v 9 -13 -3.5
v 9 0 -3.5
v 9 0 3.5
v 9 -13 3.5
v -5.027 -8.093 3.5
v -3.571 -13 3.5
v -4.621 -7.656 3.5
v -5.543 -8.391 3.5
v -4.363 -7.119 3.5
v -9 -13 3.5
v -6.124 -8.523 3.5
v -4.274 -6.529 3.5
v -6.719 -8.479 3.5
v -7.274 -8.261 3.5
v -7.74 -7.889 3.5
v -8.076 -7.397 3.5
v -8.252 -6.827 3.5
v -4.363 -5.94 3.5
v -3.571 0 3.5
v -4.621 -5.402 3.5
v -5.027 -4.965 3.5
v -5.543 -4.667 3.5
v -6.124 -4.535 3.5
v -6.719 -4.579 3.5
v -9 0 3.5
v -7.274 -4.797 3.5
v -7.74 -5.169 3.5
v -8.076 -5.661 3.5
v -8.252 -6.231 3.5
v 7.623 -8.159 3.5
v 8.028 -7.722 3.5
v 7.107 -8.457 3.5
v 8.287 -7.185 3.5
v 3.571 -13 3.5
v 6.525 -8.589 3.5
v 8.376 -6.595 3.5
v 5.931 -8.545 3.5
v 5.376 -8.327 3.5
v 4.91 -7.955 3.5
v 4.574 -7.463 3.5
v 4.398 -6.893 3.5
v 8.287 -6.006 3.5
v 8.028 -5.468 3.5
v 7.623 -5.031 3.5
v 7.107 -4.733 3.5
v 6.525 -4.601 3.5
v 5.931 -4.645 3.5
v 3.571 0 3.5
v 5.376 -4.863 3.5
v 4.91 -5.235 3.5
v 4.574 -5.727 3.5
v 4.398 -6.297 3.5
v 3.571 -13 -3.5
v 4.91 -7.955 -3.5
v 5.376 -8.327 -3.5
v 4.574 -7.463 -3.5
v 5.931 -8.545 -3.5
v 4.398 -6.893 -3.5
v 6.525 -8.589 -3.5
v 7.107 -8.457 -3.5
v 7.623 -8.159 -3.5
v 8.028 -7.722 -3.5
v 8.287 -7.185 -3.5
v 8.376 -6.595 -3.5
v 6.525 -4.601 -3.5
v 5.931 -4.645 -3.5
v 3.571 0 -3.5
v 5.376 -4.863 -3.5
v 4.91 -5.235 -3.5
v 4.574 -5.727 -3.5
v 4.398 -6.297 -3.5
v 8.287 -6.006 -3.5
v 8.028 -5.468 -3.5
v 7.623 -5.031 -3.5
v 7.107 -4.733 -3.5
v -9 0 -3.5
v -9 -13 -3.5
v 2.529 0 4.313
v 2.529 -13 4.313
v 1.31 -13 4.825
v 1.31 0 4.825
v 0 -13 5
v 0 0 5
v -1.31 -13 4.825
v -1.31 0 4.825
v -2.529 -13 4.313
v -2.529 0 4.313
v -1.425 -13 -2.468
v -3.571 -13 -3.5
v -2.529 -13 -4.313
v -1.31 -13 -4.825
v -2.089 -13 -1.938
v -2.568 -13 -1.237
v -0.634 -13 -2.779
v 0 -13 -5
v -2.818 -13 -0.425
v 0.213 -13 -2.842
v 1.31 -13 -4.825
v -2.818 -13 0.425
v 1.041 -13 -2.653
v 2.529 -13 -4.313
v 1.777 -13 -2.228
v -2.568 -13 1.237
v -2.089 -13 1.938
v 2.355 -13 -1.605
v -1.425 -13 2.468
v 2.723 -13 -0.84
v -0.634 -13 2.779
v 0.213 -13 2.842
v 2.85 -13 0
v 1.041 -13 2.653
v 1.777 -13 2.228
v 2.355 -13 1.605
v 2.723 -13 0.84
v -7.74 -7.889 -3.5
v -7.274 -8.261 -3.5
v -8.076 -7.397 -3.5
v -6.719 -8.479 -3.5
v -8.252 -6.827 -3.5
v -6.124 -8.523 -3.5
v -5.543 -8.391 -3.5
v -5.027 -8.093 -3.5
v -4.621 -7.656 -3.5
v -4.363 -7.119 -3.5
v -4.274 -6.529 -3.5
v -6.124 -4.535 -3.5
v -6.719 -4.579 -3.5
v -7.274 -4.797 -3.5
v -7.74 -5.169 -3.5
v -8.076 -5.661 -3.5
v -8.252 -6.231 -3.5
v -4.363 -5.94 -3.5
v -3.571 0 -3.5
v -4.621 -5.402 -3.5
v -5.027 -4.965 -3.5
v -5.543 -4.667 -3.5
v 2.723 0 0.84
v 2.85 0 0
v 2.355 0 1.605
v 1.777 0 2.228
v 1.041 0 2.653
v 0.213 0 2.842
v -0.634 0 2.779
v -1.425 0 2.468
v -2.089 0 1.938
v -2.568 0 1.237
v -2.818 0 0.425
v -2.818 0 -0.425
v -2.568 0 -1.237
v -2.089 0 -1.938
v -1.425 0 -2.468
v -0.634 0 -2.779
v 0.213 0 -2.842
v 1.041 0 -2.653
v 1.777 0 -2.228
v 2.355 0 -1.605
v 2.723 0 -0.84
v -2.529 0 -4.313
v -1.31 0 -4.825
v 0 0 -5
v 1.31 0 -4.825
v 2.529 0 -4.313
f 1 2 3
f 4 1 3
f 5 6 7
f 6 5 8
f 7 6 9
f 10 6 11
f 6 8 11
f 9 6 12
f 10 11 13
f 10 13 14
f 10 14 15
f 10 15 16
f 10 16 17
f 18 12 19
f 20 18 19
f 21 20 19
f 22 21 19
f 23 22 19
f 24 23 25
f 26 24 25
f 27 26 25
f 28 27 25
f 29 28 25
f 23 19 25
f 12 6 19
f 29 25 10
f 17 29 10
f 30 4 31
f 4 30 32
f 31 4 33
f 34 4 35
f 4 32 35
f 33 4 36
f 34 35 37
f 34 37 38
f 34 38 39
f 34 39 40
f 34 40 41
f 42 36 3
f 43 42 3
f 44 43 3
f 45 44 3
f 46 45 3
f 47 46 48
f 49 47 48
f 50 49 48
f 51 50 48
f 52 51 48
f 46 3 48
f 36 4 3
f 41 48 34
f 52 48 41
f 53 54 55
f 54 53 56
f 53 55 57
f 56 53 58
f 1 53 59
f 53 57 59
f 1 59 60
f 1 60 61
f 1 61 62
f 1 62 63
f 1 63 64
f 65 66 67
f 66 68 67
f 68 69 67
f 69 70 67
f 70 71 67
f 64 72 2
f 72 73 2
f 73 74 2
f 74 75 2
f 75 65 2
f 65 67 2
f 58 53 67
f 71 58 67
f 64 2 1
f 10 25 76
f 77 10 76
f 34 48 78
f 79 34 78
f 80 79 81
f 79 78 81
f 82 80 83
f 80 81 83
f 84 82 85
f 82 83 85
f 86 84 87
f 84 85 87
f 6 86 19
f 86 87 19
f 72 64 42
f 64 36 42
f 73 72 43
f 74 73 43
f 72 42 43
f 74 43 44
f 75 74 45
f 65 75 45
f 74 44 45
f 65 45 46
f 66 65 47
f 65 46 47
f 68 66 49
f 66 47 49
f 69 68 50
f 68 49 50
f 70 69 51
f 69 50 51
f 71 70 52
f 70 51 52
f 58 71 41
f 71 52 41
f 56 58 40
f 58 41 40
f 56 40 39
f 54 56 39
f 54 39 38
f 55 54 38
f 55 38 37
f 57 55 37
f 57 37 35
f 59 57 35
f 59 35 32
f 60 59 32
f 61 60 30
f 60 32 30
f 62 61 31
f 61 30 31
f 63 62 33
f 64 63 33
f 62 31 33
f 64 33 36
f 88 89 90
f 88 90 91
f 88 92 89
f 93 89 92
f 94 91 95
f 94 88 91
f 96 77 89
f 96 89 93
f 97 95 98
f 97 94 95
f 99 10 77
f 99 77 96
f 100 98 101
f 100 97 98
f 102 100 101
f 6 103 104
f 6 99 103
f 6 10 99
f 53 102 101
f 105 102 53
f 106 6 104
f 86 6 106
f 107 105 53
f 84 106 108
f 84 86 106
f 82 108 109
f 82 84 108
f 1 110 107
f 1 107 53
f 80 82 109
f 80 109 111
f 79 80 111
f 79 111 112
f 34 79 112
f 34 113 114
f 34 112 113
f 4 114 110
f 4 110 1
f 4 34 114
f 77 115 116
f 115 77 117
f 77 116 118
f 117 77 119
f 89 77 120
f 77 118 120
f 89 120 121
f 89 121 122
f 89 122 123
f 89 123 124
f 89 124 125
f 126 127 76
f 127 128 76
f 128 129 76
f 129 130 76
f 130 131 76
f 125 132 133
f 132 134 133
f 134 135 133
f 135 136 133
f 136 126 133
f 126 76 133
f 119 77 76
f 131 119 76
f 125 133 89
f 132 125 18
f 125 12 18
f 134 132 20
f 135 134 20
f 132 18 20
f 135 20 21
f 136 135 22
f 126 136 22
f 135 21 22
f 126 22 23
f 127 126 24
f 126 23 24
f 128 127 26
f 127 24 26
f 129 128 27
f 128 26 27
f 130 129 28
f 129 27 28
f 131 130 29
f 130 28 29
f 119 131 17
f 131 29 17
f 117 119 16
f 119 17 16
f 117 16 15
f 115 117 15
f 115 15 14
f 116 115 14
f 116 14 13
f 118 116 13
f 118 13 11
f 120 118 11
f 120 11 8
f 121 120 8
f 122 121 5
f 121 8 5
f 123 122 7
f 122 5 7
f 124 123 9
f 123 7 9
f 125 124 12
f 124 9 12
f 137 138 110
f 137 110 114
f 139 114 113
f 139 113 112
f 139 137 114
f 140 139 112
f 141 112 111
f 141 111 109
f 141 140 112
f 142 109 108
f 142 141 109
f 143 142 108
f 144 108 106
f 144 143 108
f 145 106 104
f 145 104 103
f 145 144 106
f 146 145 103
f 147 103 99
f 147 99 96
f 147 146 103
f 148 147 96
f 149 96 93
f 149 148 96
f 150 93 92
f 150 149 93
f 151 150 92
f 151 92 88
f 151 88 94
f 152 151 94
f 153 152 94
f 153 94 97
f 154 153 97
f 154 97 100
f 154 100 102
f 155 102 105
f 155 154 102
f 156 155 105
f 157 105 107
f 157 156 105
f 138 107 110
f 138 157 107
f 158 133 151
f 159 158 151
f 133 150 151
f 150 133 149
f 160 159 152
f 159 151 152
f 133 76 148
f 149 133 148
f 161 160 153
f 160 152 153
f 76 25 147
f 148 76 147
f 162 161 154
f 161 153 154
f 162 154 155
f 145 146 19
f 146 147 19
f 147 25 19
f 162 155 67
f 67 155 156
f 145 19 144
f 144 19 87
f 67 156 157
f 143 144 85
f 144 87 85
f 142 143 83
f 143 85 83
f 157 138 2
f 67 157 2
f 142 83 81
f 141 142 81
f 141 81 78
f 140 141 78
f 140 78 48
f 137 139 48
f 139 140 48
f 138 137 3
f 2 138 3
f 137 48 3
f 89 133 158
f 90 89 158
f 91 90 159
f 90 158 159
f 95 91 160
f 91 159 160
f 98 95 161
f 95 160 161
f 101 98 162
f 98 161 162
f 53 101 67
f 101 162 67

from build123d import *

# Parameters (mm, degrees)
F0_R     = 2.85
F1_DEPTH = 13
F2_R     = 2
F3_DEPTH = 12.5
F4_R     = 2
F5_DEPTH = 12.5


# Not quite as in the source:
# - a feature names something its author has since deleted; it is built from what else it names


with BuildPart() as f1:
    # F0 (on Front) → F1 (new body)
    with BuildSketch(Plane.XZ):
        with BuildLine():
            ThreePointArc((3.5707142143, -3.5), (4.6289075964, -1.8902948088), (5, 0))
            ThreePointArc((5, 0), (4.6289075964, 1.8902948088), (3.5707142143, 3.5))
            Line((3.5707142143, 3.5), (-3.5707142143, 3.5))
            ThreePointArc((-3.5707142143, 3.5), (-5, 0), (-3.5707142143, -3.5))
            Line((-3.5707142143, -3.5), (3.5707142143, -3.5))
        make_face()
        Circle(F0_R, mode=Mode.SUBTRACT)
        with BuildLine():
            ThreePointArc((3.5707142143, 3.5), (4.6289075964, 1.8902948088), (5, 0))
            ThreePointArc((5, 0), (4.6289075964, -1.8902948088), (3.5707142143, -3.5))
            Line((3.5707142143, -3.5), (9, -3.5))
            Line((9, -3.5), (9, 3.5))
            Line((9, 3.5), (3.5707142143, 3.5))
        make_face()
        with BuildLine():
            Line((-3.5707142143, 3.5), (3.5707142143, 3.5))
            ThreePointArc((3.5707142143, 3.5), (0, 5), (-3.5707142143, 3.5))
        make_face()
        with BuildLine():
            ThreePointArc((-3.5707142143, -3.5), (0, -5), (3.5707142143, -3.5))
            Line((3.5707142143, -3.5), (-3.5707142143, -3.5))
        make_face()
        with BuildLine():
            ThreePointArc((-3.5707142143, -3.5), (-5, 0), (-3.5707142143, 3.5))
            Line((-3.5707142143, 3.5), (-9, 3.5))
            Line((-9, 3.5), (-9, -3.5))
            Line((-9, -3.5), (-3.5707142143, -3.5))
        make_face()
    extrude(amount=F1_DEPTH)

    # F2 (on Top) → F3 (cut, symmetric)
    with BuildSketch(Plane.XY):
        with Locations((6.3759502955, -6.5950173885)):
            Circle(F2_R)
    extrude(amount=F3_DEPTH, both=True, mode=Mode.SUBTRACT)

    # F4 (on Top) → F5 (cut, symmetric)
    with BuildSketch(Plane.XY):
        with Locations((-6.2739360146, -6.5290778875)):
            Circle(F4_R)
    extrude(amount=F5_DEPTH, both=True, mode=Mode.SUBTRACT)


solid = f1.part
